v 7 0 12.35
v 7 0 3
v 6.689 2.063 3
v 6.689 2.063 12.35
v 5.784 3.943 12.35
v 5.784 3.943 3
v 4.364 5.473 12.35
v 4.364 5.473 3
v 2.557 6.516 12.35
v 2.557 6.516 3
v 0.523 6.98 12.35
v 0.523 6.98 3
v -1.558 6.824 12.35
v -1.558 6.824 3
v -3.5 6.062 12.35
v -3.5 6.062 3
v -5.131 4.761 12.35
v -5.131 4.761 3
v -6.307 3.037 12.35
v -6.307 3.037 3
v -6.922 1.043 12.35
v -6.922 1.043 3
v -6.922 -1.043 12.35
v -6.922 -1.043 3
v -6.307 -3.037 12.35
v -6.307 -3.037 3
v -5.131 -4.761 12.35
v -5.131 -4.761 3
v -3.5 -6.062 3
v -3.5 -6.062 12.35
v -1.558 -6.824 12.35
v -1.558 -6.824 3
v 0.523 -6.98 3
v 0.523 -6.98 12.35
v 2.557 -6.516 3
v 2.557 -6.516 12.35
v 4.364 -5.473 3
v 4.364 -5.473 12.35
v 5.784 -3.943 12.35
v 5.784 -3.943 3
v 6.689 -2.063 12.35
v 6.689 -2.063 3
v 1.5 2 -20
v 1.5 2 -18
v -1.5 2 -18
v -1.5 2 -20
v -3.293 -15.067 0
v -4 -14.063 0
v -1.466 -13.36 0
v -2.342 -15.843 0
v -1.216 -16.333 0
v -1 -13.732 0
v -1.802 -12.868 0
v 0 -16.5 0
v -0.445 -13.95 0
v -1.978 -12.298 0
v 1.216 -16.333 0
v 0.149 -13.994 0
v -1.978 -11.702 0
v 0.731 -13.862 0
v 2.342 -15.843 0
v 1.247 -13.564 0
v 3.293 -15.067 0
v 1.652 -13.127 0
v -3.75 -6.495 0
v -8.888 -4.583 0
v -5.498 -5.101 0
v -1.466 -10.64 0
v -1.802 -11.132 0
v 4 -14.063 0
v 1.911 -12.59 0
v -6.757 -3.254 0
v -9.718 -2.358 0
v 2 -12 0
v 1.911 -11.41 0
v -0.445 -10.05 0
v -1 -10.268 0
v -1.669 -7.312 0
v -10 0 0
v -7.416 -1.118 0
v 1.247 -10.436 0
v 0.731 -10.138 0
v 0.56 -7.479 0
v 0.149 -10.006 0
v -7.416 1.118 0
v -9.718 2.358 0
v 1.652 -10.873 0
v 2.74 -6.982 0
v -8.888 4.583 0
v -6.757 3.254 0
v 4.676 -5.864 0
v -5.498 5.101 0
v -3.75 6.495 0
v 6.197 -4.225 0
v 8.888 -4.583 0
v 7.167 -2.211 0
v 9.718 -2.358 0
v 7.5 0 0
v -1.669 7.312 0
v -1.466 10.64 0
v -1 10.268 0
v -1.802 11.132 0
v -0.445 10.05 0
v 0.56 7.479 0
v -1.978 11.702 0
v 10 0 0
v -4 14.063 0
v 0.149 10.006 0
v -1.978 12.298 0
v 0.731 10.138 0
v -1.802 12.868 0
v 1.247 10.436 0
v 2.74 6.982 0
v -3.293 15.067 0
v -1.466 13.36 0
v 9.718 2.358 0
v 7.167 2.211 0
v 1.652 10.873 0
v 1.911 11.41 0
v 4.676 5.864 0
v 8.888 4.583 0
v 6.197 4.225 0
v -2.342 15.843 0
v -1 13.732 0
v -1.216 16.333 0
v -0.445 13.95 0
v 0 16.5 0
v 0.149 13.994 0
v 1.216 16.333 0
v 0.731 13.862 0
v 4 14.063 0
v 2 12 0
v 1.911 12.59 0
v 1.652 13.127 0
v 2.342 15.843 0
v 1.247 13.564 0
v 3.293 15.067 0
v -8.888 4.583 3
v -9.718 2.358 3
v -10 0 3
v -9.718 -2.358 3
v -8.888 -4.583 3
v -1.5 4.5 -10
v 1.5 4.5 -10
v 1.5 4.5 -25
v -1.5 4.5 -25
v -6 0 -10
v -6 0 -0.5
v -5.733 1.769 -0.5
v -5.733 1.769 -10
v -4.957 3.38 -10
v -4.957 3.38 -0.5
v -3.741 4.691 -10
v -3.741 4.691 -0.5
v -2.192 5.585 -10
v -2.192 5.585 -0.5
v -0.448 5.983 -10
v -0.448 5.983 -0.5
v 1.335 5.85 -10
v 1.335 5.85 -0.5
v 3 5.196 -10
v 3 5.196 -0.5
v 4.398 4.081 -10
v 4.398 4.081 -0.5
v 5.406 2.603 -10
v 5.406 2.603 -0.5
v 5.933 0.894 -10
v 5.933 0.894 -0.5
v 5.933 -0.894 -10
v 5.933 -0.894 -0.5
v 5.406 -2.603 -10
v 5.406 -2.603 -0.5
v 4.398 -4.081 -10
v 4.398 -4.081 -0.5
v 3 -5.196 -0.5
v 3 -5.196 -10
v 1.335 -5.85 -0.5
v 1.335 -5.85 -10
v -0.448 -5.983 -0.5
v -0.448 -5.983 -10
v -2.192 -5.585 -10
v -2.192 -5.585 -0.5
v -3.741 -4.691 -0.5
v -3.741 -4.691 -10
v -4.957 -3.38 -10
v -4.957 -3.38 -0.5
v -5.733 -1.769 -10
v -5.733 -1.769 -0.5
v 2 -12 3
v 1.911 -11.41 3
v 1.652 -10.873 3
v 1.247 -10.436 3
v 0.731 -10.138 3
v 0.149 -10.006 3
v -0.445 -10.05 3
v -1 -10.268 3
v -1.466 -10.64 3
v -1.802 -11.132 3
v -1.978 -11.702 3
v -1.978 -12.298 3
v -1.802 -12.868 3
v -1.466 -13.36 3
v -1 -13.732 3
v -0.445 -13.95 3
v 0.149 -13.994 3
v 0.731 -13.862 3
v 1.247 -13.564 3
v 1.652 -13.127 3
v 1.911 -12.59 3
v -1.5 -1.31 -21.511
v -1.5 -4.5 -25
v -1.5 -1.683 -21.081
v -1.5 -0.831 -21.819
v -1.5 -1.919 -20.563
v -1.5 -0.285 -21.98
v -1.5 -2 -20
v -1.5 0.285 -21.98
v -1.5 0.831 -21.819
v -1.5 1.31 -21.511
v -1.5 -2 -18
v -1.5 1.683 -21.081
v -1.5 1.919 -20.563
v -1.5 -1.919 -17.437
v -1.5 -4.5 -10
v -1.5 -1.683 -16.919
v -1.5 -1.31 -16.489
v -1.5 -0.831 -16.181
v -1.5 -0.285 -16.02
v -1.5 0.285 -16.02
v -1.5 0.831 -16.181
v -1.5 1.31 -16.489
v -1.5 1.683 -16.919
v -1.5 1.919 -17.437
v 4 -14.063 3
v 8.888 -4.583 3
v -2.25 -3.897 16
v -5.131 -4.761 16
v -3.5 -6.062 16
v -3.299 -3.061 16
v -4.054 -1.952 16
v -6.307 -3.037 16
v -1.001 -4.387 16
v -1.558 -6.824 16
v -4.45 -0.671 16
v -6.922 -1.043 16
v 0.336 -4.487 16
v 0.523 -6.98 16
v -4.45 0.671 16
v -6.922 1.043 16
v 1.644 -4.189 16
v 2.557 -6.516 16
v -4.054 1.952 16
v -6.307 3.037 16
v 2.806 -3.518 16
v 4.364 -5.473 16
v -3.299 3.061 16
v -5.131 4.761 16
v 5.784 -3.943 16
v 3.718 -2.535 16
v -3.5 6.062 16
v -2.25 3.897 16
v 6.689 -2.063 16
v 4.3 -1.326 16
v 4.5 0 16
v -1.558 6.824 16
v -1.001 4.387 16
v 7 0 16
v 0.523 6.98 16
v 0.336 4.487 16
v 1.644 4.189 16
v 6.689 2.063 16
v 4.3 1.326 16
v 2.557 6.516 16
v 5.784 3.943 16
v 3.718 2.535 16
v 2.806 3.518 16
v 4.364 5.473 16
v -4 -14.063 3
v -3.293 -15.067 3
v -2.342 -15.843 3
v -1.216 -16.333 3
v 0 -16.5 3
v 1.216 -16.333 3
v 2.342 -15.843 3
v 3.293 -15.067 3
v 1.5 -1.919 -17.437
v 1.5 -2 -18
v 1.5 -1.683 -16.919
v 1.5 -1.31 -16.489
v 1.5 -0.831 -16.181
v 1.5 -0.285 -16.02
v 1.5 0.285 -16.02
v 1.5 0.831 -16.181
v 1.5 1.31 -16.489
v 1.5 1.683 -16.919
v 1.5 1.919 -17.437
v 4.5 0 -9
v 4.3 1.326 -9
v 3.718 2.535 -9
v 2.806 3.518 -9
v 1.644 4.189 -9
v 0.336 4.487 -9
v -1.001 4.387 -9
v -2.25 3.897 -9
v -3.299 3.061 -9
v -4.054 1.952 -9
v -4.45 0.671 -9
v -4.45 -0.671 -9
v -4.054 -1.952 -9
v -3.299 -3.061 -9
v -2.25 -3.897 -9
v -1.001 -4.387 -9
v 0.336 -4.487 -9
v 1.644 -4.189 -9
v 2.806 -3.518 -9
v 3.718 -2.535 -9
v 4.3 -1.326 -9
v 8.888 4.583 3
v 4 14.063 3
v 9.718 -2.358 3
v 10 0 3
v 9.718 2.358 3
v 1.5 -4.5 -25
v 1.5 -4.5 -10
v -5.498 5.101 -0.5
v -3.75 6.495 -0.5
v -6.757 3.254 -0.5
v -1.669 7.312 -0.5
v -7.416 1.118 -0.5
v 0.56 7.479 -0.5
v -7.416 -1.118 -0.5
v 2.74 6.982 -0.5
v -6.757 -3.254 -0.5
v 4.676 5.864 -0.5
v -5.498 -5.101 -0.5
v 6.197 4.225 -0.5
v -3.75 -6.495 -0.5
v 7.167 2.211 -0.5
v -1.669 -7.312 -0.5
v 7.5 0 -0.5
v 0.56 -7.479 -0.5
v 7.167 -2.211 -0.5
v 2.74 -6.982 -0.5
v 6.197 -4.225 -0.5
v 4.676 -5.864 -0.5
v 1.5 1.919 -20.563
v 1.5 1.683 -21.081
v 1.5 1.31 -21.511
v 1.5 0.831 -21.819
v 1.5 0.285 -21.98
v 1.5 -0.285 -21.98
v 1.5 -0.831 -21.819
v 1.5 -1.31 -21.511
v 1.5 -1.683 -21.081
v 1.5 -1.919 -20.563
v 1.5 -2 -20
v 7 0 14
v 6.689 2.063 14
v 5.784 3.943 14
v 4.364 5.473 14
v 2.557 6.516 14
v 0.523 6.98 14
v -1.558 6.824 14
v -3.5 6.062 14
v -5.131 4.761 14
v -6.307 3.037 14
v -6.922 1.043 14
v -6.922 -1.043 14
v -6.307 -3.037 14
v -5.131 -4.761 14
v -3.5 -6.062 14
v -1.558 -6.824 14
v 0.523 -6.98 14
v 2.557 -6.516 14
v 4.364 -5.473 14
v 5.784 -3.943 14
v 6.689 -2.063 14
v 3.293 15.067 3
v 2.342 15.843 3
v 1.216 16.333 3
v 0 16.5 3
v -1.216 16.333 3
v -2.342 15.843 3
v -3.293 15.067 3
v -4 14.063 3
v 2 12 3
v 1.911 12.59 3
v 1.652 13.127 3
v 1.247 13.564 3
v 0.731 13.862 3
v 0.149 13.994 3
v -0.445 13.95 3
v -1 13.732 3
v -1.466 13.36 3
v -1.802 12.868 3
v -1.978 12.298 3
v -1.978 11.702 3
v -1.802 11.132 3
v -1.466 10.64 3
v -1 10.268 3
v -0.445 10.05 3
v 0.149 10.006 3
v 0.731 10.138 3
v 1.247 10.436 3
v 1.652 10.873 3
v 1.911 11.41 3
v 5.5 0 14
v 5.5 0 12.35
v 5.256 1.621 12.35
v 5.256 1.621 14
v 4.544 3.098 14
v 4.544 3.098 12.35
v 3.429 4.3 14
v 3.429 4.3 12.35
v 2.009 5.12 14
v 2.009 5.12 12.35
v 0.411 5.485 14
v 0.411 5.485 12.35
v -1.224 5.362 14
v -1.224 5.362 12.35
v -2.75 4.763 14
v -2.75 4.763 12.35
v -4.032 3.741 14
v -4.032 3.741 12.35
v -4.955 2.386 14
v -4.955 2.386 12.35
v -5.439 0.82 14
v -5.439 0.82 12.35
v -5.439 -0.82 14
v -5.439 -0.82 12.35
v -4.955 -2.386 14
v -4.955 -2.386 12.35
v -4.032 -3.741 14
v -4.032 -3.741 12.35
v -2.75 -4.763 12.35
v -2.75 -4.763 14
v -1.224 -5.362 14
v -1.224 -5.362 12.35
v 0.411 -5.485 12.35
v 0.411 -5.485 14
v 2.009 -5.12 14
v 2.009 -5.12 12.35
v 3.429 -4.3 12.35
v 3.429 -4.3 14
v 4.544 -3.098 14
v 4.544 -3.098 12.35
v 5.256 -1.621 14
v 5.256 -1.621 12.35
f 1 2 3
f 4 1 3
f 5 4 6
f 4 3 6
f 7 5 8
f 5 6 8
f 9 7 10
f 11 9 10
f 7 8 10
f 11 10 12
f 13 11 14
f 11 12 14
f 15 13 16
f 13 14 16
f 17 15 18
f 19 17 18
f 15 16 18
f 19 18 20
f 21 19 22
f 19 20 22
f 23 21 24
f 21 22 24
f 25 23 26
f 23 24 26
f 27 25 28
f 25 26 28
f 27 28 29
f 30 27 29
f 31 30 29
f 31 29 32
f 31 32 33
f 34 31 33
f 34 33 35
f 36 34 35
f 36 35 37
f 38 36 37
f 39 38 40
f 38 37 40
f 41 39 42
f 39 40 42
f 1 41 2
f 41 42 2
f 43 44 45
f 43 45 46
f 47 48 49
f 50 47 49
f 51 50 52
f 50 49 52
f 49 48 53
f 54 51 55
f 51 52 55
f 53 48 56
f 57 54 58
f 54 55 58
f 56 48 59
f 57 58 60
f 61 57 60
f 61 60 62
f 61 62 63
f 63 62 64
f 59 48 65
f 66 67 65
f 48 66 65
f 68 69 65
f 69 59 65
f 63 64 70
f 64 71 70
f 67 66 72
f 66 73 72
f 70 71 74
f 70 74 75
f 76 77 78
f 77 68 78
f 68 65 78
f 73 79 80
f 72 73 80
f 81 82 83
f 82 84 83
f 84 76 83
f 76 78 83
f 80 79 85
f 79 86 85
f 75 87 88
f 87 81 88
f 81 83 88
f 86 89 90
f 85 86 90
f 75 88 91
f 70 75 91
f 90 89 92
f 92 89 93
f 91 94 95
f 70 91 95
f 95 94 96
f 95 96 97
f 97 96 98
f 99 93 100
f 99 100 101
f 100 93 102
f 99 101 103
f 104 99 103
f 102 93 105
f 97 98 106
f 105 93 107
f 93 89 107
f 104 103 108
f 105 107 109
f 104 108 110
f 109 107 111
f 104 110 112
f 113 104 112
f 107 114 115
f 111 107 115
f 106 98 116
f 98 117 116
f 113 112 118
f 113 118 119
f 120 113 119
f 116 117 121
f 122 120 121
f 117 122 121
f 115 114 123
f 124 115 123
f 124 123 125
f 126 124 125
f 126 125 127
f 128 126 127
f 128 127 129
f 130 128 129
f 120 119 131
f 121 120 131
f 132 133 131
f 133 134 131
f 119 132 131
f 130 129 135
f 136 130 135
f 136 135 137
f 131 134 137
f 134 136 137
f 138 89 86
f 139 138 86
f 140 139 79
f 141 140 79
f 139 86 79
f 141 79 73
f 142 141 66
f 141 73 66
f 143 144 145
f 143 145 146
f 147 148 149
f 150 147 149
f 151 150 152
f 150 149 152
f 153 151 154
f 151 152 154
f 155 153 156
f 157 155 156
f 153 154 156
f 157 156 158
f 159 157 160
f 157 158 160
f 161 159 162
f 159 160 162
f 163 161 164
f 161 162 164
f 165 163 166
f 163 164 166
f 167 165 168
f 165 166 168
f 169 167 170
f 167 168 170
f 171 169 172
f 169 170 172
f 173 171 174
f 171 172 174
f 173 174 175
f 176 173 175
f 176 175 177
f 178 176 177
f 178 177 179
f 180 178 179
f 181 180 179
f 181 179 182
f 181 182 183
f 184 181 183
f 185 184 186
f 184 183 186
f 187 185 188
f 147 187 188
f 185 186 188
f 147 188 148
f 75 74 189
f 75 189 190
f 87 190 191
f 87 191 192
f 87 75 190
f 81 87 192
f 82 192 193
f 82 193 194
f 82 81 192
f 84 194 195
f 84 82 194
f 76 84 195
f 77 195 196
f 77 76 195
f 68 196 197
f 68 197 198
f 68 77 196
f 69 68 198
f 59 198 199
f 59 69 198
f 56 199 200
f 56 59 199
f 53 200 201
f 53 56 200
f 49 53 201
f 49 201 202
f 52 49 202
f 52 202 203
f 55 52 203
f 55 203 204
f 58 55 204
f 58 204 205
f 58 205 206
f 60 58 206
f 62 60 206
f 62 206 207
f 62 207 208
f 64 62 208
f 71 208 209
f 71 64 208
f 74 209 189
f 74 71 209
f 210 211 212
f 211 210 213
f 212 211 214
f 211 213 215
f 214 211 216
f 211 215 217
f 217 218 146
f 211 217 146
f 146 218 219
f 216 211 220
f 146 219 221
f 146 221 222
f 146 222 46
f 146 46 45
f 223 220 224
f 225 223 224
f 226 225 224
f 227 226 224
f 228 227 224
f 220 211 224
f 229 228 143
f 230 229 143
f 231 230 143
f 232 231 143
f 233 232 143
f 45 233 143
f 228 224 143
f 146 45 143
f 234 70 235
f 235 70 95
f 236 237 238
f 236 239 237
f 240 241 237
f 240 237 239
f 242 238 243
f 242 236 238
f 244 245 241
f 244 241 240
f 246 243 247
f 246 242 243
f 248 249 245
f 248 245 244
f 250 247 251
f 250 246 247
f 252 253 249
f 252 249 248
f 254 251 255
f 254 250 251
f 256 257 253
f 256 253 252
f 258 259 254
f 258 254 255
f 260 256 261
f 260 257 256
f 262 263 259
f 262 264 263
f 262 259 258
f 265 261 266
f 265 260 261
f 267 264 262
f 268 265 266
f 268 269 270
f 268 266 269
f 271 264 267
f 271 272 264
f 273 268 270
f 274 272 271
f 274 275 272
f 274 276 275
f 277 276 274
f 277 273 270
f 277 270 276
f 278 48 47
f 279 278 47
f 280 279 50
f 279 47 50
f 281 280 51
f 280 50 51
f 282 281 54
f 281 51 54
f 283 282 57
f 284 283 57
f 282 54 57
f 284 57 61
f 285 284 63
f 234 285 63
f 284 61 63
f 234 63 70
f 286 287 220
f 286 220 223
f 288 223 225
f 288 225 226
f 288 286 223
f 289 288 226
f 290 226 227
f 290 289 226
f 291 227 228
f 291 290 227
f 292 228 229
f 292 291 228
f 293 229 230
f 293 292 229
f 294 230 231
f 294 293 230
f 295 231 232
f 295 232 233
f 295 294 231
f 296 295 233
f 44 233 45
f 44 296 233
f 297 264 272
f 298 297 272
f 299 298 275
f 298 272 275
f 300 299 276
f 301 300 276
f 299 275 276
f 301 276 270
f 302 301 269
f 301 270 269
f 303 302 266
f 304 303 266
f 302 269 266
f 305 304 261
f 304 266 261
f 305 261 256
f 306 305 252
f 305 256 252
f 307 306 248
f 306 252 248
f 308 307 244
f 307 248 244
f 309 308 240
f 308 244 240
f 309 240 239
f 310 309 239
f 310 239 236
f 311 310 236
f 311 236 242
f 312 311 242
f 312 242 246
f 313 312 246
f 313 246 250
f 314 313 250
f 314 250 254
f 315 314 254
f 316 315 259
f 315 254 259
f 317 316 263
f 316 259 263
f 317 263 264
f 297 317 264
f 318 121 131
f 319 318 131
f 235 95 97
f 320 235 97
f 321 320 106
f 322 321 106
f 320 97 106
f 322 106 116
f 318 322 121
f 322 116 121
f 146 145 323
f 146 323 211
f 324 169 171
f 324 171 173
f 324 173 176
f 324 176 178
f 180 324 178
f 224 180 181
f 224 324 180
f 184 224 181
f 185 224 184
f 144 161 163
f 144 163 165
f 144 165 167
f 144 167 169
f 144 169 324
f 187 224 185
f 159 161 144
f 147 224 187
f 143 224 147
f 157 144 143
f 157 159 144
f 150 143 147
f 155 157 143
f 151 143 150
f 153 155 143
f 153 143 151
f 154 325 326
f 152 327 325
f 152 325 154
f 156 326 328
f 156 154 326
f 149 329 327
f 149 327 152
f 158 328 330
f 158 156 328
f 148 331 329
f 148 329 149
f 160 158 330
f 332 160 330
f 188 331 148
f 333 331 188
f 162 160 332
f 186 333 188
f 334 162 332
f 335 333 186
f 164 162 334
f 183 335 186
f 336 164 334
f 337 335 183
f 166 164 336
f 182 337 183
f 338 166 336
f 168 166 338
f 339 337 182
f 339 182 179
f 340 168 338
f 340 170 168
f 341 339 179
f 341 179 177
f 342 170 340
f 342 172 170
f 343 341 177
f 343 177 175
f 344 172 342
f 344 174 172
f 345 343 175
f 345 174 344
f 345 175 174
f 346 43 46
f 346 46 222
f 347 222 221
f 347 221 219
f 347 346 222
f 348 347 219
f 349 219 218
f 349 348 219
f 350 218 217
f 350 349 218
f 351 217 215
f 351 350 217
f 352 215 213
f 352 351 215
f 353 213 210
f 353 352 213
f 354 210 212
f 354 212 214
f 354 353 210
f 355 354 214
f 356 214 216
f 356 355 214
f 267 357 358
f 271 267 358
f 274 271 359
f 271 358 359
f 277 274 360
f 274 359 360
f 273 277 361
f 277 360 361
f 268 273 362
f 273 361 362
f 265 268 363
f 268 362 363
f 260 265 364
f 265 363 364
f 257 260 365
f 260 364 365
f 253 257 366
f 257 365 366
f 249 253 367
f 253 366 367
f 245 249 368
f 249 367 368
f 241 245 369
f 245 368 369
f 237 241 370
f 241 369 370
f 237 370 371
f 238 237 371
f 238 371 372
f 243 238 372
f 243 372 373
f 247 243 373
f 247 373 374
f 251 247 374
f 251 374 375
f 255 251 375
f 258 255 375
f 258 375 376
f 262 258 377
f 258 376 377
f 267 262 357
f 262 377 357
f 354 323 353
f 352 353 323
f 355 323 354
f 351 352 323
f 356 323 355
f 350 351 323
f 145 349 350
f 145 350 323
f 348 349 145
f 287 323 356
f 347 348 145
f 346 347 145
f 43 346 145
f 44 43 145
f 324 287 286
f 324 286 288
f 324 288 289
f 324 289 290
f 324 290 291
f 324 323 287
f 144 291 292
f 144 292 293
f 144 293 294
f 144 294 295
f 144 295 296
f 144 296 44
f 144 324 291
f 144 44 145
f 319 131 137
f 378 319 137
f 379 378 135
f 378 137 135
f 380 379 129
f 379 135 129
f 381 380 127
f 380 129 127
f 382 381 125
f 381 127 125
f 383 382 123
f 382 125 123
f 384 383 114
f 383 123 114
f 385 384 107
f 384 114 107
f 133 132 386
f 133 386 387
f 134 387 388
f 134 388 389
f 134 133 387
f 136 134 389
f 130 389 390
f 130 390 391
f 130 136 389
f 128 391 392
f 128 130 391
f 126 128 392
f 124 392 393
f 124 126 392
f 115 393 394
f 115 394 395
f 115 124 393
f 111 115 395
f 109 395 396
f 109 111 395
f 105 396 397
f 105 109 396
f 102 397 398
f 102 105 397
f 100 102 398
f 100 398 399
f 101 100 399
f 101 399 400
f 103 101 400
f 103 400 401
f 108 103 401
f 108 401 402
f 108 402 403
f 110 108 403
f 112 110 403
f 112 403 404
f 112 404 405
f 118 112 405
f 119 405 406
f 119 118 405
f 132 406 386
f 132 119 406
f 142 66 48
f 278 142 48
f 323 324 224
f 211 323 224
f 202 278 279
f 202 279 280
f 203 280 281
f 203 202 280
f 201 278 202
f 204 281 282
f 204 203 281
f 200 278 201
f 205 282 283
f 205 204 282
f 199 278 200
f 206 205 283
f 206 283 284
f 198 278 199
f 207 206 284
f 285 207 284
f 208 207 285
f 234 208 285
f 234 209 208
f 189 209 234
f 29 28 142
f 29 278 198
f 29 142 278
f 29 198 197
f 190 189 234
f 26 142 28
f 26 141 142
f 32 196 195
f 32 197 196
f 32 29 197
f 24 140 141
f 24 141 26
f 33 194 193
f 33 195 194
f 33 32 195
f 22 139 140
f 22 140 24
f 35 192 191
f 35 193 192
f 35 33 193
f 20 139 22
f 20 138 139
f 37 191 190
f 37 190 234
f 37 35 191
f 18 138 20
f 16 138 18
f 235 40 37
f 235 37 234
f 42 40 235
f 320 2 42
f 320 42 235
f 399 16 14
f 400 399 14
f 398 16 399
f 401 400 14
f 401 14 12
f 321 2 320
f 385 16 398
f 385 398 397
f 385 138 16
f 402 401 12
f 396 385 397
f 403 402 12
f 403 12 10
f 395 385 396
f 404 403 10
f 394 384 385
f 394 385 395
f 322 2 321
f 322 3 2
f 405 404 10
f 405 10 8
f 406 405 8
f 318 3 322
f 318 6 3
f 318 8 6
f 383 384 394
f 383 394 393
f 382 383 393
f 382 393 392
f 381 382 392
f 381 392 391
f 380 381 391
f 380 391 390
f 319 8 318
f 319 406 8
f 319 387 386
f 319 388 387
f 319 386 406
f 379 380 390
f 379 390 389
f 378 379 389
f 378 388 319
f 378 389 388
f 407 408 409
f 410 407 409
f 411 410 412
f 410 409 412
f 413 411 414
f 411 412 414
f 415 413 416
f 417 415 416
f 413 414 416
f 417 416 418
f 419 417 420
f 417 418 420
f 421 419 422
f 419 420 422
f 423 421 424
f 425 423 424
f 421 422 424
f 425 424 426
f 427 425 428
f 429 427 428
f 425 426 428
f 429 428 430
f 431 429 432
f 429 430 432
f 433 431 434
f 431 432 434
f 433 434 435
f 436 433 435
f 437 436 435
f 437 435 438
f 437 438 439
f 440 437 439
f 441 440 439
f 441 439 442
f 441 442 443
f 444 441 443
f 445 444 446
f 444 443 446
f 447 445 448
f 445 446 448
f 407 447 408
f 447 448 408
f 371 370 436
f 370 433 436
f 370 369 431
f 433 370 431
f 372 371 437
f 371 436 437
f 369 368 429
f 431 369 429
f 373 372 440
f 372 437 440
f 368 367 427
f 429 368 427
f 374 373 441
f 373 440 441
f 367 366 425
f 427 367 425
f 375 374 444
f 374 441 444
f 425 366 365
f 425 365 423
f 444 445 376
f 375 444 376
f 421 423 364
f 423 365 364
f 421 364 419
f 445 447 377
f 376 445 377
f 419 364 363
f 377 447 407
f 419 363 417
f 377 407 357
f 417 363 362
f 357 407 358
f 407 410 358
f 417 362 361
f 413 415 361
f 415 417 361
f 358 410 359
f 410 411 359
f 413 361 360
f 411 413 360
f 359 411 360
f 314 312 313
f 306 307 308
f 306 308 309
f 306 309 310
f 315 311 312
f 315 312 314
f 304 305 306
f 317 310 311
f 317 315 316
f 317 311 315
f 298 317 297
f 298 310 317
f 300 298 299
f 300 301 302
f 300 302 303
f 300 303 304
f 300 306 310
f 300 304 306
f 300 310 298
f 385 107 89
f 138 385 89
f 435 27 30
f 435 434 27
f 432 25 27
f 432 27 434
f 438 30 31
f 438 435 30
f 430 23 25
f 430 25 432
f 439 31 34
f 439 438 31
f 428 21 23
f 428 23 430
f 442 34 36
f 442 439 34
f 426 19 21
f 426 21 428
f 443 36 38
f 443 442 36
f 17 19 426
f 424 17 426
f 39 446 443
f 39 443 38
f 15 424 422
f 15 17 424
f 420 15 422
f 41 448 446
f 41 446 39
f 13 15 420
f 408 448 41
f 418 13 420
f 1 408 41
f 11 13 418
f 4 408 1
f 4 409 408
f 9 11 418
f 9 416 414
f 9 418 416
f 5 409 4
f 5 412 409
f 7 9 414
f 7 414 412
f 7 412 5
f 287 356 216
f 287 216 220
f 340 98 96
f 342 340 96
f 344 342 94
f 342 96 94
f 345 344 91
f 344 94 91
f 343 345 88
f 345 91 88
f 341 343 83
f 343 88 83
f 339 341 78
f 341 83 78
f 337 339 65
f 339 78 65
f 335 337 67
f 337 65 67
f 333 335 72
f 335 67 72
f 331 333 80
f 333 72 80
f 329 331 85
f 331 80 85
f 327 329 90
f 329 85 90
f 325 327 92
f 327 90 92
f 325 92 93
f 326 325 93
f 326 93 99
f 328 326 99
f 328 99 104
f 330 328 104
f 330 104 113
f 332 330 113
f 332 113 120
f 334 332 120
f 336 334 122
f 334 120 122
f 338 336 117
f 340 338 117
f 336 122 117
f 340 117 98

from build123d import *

# Parameters (mm, degrees)
SKETCH1_R           = 2
BOSS_EXTRUDE1_DEPTH = 3
SKETCH2_R           = 7
BOSS_EXTRUDE2_DEPTH = 9.35
SKETCH3_R           = 7.5
BOSS_EXTRUDE3_DEPTH = 0.5
SKETCH4_W           = 3
SKETCH4_H           = 9
BOSS_EXTRUDE4_DEPTH = 24.5
SKETCH5_R           = 6
BOSS_EXTRUDE5_DEPTH = 9.5
SKETCH8_R           = 5.5
BOSS_EXTRUDE6_DEPTH = 1.65
SKETCH9_R           = 7
BOSS_EXTRUDE7_DEPTH = 2
SKETCH10_R          = 4.5
CUT_EXTRUDE1_DEPTH  = 25
CUT_EXTRUDE2_DEPTH  = 3


with BuildPart() as part:
    # Sketch1 → Boss-Extrude1 (new body)
    with BuildSketch(Plane.XY):
        with BuildLine():
            ThreePointArc((-3.999511648, -14.062500079), (-8.7e-08, -16.5), (3.999511568, -14.062500234))
            Line((3.999511568, -14.062500234), (8.887803753, -4.583333333))
            ThreePointArc((8.887803753, -4.583333333), (10, 0), (8.887803753, 4.583333333))
            Line((8.887803753, 4.583333333), (3.999511579, 14.062500214))
            ThreePointArc((3.999511579, 14.062500214), (-6.7e-08, 16.5), (-3.99951164, 14.062500095))
            Line((-3.99951164, 14.062500095), (-8.887803753, 4.583333333))
            ThreePointArc((-8.887803753, 4.583333333), (-10, 0), (-8.887803753, -4.583333333))
            Line((-8.887803753, -4.583333333), (-3.999511648, -14.062500079))
        make_face()
        with Locations((0, -12)):
            Circle(SKETCH1_R, mode=Mode.SUBTRACT)
        with Locations((0, 12)):
            Circle(SKETCH1_R, mode=Mode.SUBTRACT)
    extrude(amount=BOSS_EXTRUDE1_DEPTH)

    # Sketch2 → Boss-Extrude2 (add)
    with BuildSketch(Plane.XY.offset(3)):
        Circle(SKETCH2_R)
    extrude(amount=BOSS_EXTRUDE2_DEPTH)

    # Sketch3 → Boss-Extrude3 (add)
    with BuildSketch(Plane(origin=(0, 0, 0), x_dir=(-1, 0, 0), z_dir=(0, 0, -1))):
        with Locations(Location((0, 0, 0), (0, 0, 180))):
            Circle(SKETCH3_R)
    extrude(amount=BOSS_EXTRUDE3_DEPTH)

    # Sketch4 → Boss-Extrude4 (add)
    with BuildSketch(Plane(origin=(0, 0, -0.5), x_dir=(-1, 0, 0), z_dir=(0, 0, -1))):
        Rectangle(SKETCH4_W, SKETCH4_H)
    extrude(amount=BOSS_EXTRUDE4_DEPTH)

    # Sketch5 → Boss-Extrude5 (add)
    with BuildSketch(Plane(origin=(0, 0, -0.5), x_dir=(-1, 0, 0), z_dir=(0, 0, -1))):
        Circle(SKETCH5_R)
    extrude(amount=BOSS_EXTRUDE5_DEPTH)

    # Sketch8 → Boss-Extrude6 (add)
    with BuildSketch(Plane.XY.offset(12.35)):
        Circle(SKETCH8_R)
    extrude(amount=BOSS_EXTRUDE6_DEPTH)

    # Sketch9 → Boss-Extrude7 (add)
    with BuildSketch(Plane.XY.offset(14)):
        Circle(SKETCH9_R)
    extrude(amount=BOSS_EXTRUDE7_DEPTH)

    # Sketch10 → Cut-Extrude1 (cut)
    with BuildSketch(Plane.XY.offset(16)):
        Circle(SKETCH10_R)
    extrude(amount=-CUT_EXTRUDE1_DEPTH, mode=Mode.SUBTRACT)

    # Sketch15 → Cut-Extrude2 (cut)
    with BuildSketch(Plane(origin=(1.5, 0, 0), x_dir=(0, 0, -1), z_dir=(1, 0, 0))):
        with BuildLine():
            Line((20, -2), (18, -2))
            ThreePointArc((18, -2), (16, 0), (18, 2))
            Line((18, 2), (20, 2))
            ThreePointArc((20, 2), (22, 0), (20, -2))
        make_face()
    extrude(amount=-CUT_EXTRUDE2_DEPTH, mode=Mode.SUBTRACT)


solid = part.part
